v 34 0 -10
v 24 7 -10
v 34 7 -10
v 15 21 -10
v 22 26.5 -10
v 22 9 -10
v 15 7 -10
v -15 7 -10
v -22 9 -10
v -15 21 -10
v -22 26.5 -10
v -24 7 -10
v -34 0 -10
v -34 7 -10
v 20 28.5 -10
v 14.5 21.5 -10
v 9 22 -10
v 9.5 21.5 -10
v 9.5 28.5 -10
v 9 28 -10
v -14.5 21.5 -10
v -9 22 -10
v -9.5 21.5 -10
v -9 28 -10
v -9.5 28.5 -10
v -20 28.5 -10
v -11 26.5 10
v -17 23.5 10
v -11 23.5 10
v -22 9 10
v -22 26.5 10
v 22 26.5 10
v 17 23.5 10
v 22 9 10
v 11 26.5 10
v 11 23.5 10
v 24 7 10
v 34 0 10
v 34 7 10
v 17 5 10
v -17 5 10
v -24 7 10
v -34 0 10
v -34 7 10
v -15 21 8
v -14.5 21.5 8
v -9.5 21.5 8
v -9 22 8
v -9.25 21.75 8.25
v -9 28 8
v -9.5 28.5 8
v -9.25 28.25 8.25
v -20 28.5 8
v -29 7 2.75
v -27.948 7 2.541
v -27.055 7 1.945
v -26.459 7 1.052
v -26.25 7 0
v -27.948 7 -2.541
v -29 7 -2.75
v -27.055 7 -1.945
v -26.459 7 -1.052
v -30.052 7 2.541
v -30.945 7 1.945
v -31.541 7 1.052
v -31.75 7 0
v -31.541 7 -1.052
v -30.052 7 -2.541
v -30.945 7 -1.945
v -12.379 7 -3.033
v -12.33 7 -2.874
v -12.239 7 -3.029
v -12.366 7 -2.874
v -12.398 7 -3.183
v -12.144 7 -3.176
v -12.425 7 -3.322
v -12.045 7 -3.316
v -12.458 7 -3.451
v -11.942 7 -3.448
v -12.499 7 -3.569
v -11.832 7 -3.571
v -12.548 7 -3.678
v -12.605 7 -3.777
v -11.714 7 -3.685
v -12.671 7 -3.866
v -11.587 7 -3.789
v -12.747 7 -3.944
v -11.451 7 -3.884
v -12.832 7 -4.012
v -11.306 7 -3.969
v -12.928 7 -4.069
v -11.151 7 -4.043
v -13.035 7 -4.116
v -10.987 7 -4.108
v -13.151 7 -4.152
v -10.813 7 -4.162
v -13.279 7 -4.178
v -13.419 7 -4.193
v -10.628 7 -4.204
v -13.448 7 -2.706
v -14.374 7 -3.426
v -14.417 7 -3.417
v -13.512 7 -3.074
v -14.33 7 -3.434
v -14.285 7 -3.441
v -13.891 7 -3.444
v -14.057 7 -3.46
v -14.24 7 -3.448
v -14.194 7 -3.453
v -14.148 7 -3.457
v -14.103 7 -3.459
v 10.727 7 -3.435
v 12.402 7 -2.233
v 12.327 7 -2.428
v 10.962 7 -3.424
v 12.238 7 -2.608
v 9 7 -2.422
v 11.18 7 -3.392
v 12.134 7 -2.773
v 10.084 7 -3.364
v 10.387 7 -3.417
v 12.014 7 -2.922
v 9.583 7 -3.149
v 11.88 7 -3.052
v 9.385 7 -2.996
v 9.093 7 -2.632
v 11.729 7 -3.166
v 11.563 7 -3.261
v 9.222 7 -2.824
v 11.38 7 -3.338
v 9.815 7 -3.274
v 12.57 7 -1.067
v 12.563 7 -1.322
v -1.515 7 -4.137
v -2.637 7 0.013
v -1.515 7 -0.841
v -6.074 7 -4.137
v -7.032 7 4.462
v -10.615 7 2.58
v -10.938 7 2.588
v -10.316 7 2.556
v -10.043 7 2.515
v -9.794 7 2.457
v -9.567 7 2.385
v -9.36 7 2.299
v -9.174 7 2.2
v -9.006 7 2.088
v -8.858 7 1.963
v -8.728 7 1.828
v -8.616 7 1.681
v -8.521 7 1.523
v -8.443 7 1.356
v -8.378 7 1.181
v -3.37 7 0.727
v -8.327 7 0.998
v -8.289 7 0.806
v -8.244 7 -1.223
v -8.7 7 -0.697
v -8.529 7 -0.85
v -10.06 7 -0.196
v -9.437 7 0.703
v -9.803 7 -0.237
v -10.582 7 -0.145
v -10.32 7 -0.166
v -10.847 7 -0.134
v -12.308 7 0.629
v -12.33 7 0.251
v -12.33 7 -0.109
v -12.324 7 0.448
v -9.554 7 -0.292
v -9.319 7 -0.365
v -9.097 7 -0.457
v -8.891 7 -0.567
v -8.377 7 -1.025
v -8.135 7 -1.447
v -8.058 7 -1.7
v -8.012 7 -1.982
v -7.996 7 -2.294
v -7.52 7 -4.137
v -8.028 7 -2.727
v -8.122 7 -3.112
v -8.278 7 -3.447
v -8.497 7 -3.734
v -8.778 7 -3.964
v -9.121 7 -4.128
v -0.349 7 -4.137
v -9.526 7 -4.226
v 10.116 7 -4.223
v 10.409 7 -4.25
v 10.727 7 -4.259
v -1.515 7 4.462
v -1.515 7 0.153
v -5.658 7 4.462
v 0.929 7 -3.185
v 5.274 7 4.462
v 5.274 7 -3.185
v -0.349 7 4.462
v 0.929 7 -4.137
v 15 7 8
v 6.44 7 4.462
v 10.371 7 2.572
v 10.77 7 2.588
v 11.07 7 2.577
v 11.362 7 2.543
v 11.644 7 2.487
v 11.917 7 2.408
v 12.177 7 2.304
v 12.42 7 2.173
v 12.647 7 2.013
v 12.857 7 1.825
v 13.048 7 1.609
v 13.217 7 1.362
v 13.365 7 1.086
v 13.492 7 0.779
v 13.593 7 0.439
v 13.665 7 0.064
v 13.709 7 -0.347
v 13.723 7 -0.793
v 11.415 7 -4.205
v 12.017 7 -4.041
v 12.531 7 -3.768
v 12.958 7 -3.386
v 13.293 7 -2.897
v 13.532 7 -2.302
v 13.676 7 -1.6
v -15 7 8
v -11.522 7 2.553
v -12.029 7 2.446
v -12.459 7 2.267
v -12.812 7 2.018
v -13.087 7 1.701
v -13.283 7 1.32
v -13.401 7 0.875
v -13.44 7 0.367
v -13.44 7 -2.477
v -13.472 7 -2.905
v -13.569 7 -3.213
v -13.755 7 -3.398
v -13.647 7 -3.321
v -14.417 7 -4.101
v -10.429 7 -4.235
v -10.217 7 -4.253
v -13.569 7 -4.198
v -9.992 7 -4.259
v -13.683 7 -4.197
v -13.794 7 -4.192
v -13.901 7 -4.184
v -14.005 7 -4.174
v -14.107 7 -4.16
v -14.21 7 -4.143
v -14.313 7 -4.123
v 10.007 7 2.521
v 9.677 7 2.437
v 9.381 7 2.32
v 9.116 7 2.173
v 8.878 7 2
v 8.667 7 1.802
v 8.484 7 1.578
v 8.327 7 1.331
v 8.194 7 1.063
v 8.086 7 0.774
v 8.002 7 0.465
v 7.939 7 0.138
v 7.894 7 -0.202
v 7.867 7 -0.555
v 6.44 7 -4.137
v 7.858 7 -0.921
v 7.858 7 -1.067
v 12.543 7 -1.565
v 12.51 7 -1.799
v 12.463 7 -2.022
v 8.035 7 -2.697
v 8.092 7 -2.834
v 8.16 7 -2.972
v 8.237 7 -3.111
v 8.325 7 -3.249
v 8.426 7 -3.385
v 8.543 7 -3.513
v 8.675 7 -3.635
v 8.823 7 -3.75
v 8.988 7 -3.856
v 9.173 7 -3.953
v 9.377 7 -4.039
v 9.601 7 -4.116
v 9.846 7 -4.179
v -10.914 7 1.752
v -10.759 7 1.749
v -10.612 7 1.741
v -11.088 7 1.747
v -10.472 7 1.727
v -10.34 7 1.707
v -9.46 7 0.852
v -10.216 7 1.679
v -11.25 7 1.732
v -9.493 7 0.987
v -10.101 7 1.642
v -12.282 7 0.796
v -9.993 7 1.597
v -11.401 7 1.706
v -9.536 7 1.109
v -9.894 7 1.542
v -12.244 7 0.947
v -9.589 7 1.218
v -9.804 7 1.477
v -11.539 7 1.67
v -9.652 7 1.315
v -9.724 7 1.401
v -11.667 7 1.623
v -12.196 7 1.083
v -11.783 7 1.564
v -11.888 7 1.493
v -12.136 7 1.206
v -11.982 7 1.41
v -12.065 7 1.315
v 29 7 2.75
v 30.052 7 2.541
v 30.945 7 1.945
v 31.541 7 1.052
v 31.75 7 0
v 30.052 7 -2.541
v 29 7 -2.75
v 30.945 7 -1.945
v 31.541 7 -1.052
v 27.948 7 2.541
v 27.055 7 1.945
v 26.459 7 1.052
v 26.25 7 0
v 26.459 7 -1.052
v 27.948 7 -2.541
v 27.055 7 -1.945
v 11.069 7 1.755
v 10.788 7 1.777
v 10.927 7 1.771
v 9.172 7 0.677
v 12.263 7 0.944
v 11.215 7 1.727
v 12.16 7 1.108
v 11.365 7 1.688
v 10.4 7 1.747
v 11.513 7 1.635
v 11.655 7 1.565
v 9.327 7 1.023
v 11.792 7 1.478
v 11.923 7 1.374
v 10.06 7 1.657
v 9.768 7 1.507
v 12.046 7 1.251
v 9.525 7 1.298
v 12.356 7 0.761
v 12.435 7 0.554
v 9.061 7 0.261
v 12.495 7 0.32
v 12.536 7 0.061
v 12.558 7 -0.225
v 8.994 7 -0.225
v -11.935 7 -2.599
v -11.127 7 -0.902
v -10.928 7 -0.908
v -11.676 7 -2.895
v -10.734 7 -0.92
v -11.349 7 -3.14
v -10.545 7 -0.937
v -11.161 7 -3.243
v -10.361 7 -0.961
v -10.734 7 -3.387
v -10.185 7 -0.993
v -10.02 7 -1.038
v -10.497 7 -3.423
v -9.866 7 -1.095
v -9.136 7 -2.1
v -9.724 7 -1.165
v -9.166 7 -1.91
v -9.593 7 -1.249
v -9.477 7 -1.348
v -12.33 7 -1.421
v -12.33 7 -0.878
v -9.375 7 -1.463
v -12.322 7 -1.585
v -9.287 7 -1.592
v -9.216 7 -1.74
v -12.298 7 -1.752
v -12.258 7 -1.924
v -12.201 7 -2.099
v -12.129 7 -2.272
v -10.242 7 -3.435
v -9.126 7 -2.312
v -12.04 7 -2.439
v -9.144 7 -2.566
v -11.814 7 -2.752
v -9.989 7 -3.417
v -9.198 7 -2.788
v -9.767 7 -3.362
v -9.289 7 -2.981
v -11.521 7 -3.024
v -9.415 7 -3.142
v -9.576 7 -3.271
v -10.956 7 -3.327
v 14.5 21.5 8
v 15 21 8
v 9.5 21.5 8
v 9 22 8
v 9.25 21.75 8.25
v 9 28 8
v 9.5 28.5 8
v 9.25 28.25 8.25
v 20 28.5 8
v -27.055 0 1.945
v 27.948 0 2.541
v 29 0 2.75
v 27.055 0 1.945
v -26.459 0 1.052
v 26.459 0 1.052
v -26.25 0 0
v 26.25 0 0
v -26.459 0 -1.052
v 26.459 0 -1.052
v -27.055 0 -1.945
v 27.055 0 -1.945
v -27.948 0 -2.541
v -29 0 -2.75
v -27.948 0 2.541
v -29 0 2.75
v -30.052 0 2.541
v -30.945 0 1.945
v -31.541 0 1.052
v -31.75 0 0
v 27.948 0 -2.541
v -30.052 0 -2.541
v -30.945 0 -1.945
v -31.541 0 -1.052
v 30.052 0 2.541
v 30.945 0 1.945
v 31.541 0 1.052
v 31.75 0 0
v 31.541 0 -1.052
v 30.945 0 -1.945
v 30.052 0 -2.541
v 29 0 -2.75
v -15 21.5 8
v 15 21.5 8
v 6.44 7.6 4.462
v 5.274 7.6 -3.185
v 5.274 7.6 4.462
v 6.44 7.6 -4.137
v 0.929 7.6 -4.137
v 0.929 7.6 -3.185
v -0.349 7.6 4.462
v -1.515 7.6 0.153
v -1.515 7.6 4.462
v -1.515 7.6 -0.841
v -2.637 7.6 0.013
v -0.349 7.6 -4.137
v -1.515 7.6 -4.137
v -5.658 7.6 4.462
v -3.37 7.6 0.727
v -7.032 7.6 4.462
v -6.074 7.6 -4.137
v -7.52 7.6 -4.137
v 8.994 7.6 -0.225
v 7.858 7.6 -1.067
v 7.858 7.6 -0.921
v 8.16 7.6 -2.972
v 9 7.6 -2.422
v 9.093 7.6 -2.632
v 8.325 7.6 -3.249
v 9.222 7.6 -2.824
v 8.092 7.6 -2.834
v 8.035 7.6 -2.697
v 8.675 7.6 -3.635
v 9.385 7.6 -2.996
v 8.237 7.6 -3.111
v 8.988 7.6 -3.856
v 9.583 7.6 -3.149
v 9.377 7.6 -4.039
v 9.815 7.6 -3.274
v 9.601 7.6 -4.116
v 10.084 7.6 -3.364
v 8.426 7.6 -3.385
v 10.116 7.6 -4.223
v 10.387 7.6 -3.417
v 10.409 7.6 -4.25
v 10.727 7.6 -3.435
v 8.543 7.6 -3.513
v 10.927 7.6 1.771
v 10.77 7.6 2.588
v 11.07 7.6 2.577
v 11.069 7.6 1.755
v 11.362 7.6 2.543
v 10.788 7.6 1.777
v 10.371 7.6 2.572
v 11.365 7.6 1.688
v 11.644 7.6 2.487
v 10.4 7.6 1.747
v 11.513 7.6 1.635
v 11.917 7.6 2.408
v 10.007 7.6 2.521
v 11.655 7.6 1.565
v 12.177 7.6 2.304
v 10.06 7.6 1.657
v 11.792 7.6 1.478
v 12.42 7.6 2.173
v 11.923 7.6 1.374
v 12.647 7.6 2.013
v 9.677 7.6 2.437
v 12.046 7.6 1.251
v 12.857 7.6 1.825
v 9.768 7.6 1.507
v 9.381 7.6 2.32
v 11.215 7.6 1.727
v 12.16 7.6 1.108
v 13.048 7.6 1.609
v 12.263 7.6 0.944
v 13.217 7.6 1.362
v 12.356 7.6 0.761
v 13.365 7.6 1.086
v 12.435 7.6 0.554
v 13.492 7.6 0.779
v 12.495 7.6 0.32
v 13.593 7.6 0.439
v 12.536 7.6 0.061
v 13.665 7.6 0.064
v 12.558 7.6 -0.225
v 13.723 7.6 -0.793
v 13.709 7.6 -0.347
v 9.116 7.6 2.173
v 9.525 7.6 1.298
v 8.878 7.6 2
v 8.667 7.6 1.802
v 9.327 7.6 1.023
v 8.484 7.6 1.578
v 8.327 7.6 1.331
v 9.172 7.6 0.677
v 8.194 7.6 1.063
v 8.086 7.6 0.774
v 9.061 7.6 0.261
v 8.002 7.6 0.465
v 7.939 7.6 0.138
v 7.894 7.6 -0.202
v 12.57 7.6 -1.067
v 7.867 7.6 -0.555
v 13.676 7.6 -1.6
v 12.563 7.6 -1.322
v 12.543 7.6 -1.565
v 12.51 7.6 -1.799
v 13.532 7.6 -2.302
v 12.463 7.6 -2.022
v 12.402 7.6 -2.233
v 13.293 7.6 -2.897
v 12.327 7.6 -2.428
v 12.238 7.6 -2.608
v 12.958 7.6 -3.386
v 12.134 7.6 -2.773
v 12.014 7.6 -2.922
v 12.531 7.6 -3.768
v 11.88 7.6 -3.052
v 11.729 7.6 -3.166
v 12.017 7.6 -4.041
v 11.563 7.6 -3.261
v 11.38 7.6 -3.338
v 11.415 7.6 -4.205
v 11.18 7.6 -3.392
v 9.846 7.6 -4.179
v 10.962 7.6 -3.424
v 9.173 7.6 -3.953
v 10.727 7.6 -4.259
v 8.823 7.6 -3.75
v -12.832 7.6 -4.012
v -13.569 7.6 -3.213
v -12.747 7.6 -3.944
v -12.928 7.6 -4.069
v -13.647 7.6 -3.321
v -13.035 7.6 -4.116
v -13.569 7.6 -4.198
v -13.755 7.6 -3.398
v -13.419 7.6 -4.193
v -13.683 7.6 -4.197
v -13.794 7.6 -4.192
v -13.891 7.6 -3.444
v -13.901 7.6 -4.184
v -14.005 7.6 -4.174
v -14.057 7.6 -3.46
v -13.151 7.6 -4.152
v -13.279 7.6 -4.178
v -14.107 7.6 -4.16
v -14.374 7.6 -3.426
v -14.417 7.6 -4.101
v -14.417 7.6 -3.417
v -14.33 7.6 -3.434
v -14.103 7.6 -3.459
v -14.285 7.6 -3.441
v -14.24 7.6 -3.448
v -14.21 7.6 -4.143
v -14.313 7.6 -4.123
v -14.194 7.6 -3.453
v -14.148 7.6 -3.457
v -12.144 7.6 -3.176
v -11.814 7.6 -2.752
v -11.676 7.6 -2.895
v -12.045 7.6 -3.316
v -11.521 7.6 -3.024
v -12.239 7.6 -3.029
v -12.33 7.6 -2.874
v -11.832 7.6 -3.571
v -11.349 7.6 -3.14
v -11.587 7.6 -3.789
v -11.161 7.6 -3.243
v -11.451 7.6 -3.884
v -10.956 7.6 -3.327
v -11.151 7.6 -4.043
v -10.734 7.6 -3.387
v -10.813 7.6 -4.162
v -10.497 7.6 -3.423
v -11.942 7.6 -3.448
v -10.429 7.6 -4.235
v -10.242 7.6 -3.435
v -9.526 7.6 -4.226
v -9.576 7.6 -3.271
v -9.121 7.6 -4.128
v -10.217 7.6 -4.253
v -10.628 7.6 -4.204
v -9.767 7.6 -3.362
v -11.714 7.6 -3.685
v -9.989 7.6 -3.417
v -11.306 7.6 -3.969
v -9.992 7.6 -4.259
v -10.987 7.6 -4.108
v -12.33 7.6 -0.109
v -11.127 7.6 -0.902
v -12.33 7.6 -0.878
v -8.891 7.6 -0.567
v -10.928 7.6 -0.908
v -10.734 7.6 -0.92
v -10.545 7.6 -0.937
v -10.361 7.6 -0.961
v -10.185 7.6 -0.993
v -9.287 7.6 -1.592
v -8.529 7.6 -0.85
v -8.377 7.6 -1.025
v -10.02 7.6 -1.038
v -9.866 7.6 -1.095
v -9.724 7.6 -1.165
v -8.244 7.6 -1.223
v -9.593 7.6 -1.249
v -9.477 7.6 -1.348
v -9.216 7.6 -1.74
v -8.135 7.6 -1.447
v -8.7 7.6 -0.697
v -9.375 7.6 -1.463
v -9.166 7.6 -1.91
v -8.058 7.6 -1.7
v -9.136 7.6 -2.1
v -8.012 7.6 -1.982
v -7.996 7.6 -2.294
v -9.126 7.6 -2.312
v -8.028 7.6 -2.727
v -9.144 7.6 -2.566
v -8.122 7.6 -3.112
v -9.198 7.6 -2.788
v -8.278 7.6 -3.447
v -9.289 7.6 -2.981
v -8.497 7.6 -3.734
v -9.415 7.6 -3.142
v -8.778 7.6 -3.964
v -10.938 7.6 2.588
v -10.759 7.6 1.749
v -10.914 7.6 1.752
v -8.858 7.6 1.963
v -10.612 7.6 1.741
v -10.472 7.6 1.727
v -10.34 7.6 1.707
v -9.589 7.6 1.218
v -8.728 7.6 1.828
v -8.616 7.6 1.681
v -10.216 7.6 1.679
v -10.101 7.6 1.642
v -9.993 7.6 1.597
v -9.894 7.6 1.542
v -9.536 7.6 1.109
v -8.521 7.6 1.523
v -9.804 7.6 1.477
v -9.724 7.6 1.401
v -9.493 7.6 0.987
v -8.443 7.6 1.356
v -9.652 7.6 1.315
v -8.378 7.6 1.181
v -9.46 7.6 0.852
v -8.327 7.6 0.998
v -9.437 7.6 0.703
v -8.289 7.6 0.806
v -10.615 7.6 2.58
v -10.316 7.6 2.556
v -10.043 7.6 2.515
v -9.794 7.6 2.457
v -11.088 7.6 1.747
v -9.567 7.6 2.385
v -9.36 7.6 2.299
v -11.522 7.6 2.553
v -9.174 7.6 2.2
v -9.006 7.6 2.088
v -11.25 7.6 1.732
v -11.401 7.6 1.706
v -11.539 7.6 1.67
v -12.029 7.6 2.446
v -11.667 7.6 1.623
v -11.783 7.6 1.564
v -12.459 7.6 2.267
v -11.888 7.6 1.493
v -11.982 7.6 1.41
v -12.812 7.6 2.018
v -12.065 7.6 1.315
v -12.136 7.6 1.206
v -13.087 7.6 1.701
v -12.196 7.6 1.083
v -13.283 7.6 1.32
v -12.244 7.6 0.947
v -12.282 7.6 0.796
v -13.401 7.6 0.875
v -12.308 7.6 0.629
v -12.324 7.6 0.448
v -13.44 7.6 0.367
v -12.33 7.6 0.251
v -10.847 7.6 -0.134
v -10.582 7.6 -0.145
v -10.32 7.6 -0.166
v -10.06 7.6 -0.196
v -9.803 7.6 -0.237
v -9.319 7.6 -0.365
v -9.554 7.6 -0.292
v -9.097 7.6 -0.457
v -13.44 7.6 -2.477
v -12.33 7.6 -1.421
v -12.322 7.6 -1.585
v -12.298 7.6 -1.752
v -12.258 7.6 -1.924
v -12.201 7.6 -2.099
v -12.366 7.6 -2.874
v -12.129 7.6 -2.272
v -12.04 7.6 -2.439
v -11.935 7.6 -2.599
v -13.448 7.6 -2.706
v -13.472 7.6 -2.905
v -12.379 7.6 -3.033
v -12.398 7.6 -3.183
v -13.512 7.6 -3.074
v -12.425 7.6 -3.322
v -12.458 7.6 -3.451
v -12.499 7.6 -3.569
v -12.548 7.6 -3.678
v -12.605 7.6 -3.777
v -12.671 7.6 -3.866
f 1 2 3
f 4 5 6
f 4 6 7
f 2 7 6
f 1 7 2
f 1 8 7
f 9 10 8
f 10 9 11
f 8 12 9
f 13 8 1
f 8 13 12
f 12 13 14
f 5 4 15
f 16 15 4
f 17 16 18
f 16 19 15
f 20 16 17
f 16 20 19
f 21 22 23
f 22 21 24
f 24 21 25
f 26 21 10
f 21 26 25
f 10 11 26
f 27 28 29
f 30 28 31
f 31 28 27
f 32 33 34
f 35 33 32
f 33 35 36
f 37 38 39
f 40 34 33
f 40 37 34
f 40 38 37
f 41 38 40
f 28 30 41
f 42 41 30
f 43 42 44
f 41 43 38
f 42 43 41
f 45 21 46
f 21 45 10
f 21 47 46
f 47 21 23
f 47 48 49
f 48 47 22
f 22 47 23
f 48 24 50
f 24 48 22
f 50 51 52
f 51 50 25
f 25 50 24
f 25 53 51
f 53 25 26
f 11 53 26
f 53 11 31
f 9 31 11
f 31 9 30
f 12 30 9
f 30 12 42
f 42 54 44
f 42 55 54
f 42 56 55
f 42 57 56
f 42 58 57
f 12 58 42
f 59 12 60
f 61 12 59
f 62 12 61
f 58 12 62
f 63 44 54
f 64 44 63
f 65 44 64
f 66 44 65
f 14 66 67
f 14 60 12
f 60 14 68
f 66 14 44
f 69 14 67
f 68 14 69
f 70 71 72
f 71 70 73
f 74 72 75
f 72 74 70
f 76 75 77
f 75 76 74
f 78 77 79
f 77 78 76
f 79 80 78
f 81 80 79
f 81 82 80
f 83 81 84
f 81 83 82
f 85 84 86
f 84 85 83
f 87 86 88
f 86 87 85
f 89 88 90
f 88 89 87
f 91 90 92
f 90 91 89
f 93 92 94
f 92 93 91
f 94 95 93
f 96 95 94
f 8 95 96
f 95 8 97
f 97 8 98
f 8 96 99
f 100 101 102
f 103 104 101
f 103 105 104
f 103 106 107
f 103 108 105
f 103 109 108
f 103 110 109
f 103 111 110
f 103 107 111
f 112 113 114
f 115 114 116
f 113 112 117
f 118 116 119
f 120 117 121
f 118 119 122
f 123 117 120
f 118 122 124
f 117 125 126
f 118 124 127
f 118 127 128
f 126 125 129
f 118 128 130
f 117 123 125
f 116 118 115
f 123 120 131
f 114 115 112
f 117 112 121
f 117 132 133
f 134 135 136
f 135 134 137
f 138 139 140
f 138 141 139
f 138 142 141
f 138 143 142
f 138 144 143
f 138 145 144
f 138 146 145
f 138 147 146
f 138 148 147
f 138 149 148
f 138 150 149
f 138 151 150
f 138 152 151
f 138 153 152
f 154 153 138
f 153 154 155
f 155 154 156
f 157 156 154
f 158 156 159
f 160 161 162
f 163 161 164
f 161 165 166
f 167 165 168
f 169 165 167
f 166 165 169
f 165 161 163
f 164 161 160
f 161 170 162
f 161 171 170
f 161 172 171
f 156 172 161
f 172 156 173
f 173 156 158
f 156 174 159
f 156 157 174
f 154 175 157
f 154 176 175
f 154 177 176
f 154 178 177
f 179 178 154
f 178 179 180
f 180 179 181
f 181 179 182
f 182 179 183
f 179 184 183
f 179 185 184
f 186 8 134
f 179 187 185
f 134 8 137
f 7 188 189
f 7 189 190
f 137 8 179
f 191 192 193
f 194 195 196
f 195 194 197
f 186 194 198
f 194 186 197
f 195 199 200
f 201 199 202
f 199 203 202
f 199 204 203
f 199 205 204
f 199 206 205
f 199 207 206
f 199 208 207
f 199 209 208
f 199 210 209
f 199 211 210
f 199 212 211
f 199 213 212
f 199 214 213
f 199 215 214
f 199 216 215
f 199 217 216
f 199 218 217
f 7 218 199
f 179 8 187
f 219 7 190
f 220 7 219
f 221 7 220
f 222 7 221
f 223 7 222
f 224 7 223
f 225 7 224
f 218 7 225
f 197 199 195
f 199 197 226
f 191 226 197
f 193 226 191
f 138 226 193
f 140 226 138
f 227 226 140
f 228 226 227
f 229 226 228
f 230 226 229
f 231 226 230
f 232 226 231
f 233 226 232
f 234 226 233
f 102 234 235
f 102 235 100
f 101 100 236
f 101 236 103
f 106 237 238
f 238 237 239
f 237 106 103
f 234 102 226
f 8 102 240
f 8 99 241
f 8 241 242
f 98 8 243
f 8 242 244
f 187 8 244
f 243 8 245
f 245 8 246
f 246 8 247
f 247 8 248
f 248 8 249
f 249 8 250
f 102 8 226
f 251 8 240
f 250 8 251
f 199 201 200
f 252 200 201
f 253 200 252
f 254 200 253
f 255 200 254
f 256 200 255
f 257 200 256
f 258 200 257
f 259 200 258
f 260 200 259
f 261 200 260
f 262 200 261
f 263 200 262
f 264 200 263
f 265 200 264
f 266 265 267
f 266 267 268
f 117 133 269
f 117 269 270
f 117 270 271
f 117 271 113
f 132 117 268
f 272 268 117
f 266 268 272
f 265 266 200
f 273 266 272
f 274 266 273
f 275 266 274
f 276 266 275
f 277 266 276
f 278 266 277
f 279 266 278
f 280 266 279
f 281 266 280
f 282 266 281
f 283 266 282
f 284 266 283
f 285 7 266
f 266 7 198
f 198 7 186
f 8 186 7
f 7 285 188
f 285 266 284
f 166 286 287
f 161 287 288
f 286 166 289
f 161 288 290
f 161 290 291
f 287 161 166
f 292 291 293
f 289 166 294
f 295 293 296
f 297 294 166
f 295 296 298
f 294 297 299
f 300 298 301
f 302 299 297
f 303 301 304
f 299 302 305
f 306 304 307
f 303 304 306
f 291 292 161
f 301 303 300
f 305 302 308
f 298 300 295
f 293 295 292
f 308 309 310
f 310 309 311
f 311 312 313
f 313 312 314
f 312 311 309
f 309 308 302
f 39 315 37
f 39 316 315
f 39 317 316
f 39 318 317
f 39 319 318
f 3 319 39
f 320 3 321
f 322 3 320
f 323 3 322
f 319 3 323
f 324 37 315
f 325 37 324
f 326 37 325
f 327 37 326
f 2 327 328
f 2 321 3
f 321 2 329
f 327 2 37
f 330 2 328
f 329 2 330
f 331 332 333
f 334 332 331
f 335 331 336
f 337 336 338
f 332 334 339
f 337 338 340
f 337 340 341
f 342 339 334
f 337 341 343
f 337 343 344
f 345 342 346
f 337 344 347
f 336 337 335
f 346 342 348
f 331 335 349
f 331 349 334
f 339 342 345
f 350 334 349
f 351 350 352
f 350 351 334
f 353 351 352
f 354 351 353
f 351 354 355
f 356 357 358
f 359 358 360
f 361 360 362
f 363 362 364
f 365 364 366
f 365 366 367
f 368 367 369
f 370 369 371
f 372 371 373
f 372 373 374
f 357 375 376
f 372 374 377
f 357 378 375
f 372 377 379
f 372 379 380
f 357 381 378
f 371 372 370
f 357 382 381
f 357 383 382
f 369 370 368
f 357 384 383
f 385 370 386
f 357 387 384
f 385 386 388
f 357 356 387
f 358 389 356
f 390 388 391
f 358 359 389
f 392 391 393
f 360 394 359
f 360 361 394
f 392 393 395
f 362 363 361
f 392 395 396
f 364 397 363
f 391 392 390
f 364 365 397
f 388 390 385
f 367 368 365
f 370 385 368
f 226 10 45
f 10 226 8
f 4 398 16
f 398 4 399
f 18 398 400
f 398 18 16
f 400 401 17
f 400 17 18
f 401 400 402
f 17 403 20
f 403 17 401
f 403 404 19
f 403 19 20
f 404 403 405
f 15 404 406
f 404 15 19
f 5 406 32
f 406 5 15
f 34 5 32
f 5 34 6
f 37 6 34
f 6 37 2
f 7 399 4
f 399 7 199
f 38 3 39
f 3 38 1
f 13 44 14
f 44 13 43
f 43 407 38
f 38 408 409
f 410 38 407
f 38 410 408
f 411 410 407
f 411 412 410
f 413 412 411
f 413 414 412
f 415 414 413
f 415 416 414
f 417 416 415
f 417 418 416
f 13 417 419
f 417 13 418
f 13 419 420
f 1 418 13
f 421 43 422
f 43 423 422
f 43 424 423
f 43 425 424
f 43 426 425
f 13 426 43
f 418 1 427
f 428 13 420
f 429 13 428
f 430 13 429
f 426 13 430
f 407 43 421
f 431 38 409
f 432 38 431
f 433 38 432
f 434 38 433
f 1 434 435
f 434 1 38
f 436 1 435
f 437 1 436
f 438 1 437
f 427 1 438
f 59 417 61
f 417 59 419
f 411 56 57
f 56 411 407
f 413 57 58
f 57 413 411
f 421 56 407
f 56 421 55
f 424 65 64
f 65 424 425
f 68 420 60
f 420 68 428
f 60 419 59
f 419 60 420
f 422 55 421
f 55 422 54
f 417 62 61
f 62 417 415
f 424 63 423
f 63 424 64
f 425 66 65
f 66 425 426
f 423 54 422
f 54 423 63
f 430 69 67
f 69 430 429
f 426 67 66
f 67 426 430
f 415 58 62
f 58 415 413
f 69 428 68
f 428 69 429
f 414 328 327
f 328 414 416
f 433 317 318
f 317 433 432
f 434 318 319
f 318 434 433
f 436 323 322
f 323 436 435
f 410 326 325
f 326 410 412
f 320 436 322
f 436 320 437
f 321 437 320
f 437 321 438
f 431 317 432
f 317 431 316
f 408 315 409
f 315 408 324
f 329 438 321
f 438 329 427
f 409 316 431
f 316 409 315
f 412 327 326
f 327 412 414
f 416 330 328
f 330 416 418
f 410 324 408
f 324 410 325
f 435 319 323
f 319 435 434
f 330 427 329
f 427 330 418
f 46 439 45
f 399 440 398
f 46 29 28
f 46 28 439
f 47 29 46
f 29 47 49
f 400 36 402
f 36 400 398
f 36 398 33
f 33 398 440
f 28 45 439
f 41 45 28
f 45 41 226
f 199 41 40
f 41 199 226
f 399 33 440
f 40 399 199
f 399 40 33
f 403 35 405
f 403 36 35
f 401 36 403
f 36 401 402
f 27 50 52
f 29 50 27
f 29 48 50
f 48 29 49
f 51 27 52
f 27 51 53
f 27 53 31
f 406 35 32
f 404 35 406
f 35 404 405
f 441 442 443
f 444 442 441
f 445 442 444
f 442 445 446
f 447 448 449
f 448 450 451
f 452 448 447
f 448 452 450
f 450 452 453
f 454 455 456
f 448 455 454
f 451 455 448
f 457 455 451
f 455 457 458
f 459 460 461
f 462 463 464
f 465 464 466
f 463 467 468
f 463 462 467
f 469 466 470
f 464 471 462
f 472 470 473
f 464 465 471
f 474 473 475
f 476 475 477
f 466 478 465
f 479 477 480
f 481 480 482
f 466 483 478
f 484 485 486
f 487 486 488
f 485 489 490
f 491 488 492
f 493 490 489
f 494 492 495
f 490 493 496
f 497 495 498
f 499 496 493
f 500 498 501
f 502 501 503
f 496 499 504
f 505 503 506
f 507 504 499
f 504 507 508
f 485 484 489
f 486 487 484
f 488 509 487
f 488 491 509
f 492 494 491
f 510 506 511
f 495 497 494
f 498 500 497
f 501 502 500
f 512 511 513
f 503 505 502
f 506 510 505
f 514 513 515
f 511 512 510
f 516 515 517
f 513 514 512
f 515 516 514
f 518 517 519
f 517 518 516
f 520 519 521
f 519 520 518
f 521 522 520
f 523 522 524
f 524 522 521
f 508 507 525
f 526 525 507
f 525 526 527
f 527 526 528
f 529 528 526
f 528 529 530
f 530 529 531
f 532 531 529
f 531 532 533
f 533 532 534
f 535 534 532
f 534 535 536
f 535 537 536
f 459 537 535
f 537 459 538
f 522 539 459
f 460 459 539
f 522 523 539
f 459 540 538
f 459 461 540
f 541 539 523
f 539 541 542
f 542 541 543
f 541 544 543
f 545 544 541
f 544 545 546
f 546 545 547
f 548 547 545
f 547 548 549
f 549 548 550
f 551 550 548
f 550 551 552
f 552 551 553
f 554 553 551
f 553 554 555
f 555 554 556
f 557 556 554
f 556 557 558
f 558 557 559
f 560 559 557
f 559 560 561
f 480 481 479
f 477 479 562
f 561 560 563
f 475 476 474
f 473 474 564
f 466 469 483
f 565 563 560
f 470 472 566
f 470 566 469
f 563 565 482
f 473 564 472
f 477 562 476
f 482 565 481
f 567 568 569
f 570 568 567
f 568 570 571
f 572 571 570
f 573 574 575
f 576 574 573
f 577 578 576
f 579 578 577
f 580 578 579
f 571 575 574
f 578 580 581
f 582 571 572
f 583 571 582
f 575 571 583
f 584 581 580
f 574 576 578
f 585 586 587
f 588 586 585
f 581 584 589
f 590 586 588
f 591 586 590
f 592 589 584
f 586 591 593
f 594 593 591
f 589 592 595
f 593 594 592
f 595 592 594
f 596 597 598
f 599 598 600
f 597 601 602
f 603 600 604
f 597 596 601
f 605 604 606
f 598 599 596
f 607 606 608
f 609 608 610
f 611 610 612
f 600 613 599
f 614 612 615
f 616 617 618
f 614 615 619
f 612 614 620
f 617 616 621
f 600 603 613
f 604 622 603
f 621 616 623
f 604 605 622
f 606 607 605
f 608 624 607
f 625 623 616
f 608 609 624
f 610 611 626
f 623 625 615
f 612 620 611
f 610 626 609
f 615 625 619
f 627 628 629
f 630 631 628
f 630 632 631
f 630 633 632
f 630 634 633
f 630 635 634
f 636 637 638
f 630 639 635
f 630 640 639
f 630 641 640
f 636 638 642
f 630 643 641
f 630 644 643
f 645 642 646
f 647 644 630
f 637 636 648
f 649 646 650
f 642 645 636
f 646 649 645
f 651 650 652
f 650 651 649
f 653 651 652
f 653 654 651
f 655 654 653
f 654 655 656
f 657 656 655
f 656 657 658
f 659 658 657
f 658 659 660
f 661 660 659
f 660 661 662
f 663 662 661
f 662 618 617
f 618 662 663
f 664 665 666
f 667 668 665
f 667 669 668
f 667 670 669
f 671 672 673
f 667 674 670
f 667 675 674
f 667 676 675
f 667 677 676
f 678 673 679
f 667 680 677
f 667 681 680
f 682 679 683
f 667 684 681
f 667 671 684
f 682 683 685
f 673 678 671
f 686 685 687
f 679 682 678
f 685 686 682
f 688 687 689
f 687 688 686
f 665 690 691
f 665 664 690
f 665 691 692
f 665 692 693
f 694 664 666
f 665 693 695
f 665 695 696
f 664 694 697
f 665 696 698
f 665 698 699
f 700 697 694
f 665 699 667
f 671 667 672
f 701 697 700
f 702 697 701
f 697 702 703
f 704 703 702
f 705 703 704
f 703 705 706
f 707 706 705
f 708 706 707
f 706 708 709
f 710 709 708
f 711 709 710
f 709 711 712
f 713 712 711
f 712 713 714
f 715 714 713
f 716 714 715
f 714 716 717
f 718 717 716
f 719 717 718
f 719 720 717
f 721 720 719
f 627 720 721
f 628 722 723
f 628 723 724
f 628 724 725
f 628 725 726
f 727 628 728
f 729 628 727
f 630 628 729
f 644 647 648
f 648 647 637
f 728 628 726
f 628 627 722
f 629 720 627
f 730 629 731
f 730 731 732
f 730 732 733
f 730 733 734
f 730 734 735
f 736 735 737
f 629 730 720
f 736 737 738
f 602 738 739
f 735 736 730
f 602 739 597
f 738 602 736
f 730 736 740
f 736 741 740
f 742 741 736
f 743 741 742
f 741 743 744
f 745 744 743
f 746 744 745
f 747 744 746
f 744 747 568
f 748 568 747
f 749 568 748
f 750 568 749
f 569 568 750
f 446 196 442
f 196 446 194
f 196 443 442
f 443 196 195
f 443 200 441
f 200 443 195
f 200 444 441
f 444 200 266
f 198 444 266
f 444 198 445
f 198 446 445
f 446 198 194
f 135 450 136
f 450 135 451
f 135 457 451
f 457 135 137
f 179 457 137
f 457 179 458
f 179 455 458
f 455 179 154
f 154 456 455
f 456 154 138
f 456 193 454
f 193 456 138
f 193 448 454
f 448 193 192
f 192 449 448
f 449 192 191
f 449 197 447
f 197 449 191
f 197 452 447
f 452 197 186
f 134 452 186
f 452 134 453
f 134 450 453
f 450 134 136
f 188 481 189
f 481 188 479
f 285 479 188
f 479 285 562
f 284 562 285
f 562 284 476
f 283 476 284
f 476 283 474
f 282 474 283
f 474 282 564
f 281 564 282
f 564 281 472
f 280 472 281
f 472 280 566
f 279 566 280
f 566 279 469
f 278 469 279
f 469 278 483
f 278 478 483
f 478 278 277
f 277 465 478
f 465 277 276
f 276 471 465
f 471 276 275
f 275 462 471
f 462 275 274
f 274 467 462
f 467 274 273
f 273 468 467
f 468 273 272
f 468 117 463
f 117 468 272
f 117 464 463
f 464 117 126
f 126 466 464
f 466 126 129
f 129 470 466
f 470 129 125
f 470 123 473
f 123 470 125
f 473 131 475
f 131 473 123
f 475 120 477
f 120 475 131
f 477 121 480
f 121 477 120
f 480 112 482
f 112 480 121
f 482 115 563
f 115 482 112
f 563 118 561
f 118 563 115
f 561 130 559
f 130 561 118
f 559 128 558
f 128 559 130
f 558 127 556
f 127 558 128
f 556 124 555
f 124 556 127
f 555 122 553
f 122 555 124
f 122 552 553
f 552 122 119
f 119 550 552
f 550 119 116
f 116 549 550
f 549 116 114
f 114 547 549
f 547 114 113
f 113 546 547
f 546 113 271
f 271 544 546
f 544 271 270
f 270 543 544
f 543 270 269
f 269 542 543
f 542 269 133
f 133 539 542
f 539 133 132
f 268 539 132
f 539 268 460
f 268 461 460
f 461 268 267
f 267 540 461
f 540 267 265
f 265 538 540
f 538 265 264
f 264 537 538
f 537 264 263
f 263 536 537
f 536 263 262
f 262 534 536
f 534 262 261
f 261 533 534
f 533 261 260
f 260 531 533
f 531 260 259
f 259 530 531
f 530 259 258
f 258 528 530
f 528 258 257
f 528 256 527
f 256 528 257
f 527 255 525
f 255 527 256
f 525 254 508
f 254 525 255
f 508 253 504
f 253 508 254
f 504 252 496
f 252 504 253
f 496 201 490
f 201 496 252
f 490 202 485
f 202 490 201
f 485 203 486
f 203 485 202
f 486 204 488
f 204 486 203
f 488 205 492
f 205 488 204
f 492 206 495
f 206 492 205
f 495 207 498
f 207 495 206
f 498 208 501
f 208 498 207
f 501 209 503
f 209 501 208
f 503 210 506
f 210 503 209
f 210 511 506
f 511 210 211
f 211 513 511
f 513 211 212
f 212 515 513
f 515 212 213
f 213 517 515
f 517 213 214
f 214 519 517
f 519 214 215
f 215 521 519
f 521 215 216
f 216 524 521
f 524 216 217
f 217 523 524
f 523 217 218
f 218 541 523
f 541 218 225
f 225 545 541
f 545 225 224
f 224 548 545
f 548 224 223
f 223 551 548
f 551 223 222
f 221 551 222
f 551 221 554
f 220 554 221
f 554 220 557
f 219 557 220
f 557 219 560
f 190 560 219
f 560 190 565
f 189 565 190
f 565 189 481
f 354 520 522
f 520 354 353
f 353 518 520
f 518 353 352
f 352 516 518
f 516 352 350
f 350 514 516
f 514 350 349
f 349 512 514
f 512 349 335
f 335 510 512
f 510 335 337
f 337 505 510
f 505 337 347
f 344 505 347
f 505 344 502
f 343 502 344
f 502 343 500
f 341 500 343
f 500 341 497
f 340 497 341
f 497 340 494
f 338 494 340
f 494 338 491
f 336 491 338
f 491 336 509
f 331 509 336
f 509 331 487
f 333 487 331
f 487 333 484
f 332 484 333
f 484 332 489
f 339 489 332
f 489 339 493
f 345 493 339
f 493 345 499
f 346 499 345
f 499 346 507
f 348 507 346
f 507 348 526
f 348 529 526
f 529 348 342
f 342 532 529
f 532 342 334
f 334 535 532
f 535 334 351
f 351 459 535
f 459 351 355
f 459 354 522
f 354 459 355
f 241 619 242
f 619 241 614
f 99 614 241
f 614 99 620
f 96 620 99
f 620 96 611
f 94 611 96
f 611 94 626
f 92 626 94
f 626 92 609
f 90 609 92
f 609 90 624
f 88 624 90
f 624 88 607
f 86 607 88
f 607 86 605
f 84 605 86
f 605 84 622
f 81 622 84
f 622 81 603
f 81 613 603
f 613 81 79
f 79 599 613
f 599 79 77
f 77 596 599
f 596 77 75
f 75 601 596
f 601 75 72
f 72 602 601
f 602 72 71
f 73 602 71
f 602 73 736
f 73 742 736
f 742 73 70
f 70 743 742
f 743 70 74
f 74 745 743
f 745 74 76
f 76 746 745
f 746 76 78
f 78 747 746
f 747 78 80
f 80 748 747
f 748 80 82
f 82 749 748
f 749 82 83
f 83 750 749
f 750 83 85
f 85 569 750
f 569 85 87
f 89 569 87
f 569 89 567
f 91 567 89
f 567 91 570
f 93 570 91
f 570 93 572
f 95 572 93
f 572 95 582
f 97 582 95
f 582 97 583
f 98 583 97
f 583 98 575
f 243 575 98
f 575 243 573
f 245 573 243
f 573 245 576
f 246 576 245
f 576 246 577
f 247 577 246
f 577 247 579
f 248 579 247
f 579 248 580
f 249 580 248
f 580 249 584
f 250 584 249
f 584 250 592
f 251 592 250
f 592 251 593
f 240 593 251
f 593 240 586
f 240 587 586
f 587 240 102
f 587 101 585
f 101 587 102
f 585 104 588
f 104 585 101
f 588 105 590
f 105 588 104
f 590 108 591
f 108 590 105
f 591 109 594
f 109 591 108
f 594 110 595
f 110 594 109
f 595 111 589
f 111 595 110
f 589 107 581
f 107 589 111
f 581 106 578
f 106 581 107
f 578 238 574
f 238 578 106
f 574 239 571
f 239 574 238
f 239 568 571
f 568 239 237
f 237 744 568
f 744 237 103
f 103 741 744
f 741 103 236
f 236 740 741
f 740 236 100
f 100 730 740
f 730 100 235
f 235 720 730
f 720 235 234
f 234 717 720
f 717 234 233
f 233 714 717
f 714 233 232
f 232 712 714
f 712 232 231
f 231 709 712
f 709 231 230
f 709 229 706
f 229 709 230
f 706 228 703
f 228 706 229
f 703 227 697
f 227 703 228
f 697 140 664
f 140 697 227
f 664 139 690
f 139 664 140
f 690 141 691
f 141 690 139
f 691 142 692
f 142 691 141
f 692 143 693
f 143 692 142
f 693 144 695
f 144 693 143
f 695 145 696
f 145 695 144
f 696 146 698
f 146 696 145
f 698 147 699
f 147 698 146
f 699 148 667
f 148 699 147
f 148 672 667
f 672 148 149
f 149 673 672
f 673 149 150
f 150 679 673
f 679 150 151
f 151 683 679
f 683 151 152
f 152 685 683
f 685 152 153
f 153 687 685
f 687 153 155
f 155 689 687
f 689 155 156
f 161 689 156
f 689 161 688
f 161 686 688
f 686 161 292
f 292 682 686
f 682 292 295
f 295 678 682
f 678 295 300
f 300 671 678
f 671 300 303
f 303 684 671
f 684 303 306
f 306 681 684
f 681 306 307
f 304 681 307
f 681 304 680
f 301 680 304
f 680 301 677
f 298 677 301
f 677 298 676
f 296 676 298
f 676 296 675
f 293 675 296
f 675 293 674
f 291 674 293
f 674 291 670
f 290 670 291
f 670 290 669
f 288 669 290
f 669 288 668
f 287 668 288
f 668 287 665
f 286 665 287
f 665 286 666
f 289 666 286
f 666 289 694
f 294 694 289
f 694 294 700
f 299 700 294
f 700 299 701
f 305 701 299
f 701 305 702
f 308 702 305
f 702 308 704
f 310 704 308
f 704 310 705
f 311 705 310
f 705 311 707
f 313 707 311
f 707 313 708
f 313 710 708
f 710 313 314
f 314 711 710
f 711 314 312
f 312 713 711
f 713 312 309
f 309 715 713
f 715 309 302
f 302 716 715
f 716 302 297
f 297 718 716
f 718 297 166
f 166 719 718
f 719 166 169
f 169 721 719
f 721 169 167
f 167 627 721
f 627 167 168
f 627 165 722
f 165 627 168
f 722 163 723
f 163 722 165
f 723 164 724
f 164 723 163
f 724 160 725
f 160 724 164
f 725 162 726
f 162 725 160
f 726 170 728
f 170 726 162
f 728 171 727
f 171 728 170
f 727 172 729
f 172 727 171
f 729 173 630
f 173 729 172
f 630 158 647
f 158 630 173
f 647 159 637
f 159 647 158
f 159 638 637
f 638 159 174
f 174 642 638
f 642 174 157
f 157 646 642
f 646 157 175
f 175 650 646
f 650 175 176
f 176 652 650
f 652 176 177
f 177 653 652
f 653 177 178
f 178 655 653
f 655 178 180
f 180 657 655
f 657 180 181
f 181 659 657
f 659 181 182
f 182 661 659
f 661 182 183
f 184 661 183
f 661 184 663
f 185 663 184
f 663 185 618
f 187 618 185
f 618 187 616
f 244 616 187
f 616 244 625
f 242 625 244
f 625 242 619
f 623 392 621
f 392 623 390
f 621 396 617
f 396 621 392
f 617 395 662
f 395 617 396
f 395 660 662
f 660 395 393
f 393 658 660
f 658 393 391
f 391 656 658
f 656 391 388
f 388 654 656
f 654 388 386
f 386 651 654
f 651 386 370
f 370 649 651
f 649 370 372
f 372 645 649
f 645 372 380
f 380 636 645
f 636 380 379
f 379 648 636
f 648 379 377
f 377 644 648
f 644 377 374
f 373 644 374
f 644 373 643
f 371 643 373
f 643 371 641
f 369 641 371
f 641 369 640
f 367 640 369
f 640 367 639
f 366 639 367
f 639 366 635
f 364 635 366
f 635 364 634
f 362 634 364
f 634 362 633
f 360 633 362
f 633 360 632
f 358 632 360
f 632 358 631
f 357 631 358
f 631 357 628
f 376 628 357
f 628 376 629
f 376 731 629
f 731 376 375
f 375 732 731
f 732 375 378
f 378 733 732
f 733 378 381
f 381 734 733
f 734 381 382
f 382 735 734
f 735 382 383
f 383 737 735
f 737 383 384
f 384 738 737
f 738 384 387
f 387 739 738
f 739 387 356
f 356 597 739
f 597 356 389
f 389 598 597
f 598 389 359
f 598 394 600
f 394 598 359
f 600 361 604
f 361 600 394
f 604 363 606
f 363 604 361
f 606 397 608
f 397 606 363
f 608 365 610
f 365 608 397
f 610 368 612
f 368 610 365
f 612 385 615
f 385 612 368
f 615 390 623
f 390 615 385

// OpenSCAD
// file: config.scad
// Paramètres de la machine

decal=-30;            // décallage du chassis xz
hauteur=400;          // hauteur totale chassis
largeur=350;          // largeur totale chassis
longueur=500;         // longueur totale chassis
hauteur_base=90;      // hauteur de la base
entraxe_y=140;        // distance entre les tiges Ø8 axe Y

couleur=[1,0.6,0];



// Paramètre des pièces et jeux

// écart plateau/courroie
// y_belt_holder
belt_h=13;      // écart entre la courroie et le plateau

// écart plateau/tiges lisses
// y_lm8uu
decal_plateau=12; // Décallage en Y

// décallage des tiges lisses Y
// support_tige8_y
decal_tiges=5;

// décallage moteur Y
// y_motor
decal_motory_z=11;
decal_motory_y=25;

// Plats écrous
ec3=5.7;
ec4=7.2;
ec5=8.2;
ec6=10.2;

// Jeu sur plats pour les écrous glissants
jec=0.2;

// hauteur écrous
ec3h=2.4;
ec4h=3.2;
ec5h=4.7;
ec6h=5.2;

// Vis
vis3=3.5;
vis4=4.5;
vis5=5.5;
vis6=6.5;

// nombre de dents des poulies
poulie=20;
// main file
include <config.scad>;
module omega3(){

  ep=7;       // épaisseur
  diam=5.5;   // diamètre des trous
  pro=30;     // profilé
  lar=20;     // largeur
  ch=2;       // chanfrein extérieur
  ch2=0.5;    // chanfrein rainure
  ra=7;       // largeur rainure
  ra2=6;      // profondeur rainure
  ob=10;      // entraxe trou oblong
  ec=10;      // écart entre les profilés
  lar2=12;    // largeur des fixations

  echo ("omega3");
  
  module patte () {
  translate([-pro/2,0,0])
  linear_extrude(height=lar, center=true, convexity=10)
    polygon([[0,0],[0,-ep+pro/2+ec-ra/2-ch2],[0+ch2,-ep+pro/2+ec-ra/2],[ra2-ch2,-ep+pro/2+ec-ra/2],[ra2,-ep+pro/2+ec-ra/2+ch2],[ra2,-ep+pro/2+ec+ra/2-ch2],[ra2-ch2,-ep+pro/2+ec+ra/2],[-ep+ch,-ep+pro/2+ec+ra/2],[-ep,-ep+pro/2+ec+ra/2-ch],[-ep,0+ch],[-ep-ch,0]]);
  }
  color (couleur)
  translate([0,ep,0]){
    difference(){
      union(){
        patte();
        scale([-1,1,1]) patte();
        translate([-pro/2-lar2-ep,-ep,-lar/2]) cube([pro+2*ep+2*lar2, ep, lar]);
      }
      translate([-pro/2-ep-ch-(lar2-ch)/2,1,0]) rotate([90,0,0]) cylinder(h=ep+2,d=diam,$fn=16);
      translate([pro/2+ep+ch+(lar2-ch)/2,1,0]) rotate([90,0,0]) cylinder(h=ep+2,d=diam,$fn=16);
      // chanfreins
      hull(){
        translate([-pro/2,0,lar/2-ch]) rotate([0,0,45]) cylinder(d1=0, d2=(ch*2+2)*sqrt(2), h=ch+1, $fn=4);
        translate([pro/2,0,lar/2-ch]) rotate([0,0,45]) cylinder(d1=0, d2=(ch*2+2)*sqrt(2), h=ch+1, $fn=4);
        translate([-pro/2,-ep+pro/2+ec-ra/2,lar/2-ch]) rotate([0,0,45]) cylinder(d1=0, d2=(ch*2+2)*sqrt(2), h=ch+1, $fn=4);
        translate([pro/2,-ep+pro/2+ec-ra/2,lar/2-ch]) rotate([0,0,45]) cylinder(d1=0, d2=(ch*2+2)*sqrt(2), h=ch+1, $fn=4);
      }
      hull(){
        translate([-pro/2+ra2,ec+pro/2+ra/2,lar/2-ch]) rotate([0,0,45]) cylinder(d1=0, d2=(ch*2+2)*sqrt(2), h=ch+1, $fn=4);
        translate([pro/2-ra2,ec+pro/2+ra/2,lar/2-ch]) rotate([0,0,45]) cylinder(d1=0, d2=(ch*2+2)*sqrt(2), h=ch+1, $fn=4);
        translate([-pro/2+ra2,-ep+pro/2+ec-ra/2,lar/2-ch]) rotate([0,0,45]) cylinder(d1=0, d2=(ch*2+2)*sqrt(2), h=ch+1, $fn=4);
        translate([pro/2-ra2,-ep+pro/2+ec-ra/2,lar/2-ch]) rotate([0,0,45]) cylinder(d1=0, d2=(ch*2+2)*sqrt(2), h=ch+1, $fn=4);
      }
      hull(){
        translate([-pro/2-ep,-ep+pro/2+ec+ra/2,lar/2-ch]) rotate([0,0,45]) cylinder(d1=0, d2=(ch*2+2)*sqrt(2), h=ch+1, $fn=4);
        translate([pro/2+ep,-ep+pro/2+ec+ra/2,lar/2-ch]) rotate([0,0,45]) cylinder(d1=0, d2=(ch*2+2)*sqrt(2), h=ch+1, $fn=4);
      }
    }
    translate([0,0,0]) rotate([90,0,180]) linear_extrude(0.6) text("eLKa", halign="center", valign="center",size=9);
  }
}

omega3();
